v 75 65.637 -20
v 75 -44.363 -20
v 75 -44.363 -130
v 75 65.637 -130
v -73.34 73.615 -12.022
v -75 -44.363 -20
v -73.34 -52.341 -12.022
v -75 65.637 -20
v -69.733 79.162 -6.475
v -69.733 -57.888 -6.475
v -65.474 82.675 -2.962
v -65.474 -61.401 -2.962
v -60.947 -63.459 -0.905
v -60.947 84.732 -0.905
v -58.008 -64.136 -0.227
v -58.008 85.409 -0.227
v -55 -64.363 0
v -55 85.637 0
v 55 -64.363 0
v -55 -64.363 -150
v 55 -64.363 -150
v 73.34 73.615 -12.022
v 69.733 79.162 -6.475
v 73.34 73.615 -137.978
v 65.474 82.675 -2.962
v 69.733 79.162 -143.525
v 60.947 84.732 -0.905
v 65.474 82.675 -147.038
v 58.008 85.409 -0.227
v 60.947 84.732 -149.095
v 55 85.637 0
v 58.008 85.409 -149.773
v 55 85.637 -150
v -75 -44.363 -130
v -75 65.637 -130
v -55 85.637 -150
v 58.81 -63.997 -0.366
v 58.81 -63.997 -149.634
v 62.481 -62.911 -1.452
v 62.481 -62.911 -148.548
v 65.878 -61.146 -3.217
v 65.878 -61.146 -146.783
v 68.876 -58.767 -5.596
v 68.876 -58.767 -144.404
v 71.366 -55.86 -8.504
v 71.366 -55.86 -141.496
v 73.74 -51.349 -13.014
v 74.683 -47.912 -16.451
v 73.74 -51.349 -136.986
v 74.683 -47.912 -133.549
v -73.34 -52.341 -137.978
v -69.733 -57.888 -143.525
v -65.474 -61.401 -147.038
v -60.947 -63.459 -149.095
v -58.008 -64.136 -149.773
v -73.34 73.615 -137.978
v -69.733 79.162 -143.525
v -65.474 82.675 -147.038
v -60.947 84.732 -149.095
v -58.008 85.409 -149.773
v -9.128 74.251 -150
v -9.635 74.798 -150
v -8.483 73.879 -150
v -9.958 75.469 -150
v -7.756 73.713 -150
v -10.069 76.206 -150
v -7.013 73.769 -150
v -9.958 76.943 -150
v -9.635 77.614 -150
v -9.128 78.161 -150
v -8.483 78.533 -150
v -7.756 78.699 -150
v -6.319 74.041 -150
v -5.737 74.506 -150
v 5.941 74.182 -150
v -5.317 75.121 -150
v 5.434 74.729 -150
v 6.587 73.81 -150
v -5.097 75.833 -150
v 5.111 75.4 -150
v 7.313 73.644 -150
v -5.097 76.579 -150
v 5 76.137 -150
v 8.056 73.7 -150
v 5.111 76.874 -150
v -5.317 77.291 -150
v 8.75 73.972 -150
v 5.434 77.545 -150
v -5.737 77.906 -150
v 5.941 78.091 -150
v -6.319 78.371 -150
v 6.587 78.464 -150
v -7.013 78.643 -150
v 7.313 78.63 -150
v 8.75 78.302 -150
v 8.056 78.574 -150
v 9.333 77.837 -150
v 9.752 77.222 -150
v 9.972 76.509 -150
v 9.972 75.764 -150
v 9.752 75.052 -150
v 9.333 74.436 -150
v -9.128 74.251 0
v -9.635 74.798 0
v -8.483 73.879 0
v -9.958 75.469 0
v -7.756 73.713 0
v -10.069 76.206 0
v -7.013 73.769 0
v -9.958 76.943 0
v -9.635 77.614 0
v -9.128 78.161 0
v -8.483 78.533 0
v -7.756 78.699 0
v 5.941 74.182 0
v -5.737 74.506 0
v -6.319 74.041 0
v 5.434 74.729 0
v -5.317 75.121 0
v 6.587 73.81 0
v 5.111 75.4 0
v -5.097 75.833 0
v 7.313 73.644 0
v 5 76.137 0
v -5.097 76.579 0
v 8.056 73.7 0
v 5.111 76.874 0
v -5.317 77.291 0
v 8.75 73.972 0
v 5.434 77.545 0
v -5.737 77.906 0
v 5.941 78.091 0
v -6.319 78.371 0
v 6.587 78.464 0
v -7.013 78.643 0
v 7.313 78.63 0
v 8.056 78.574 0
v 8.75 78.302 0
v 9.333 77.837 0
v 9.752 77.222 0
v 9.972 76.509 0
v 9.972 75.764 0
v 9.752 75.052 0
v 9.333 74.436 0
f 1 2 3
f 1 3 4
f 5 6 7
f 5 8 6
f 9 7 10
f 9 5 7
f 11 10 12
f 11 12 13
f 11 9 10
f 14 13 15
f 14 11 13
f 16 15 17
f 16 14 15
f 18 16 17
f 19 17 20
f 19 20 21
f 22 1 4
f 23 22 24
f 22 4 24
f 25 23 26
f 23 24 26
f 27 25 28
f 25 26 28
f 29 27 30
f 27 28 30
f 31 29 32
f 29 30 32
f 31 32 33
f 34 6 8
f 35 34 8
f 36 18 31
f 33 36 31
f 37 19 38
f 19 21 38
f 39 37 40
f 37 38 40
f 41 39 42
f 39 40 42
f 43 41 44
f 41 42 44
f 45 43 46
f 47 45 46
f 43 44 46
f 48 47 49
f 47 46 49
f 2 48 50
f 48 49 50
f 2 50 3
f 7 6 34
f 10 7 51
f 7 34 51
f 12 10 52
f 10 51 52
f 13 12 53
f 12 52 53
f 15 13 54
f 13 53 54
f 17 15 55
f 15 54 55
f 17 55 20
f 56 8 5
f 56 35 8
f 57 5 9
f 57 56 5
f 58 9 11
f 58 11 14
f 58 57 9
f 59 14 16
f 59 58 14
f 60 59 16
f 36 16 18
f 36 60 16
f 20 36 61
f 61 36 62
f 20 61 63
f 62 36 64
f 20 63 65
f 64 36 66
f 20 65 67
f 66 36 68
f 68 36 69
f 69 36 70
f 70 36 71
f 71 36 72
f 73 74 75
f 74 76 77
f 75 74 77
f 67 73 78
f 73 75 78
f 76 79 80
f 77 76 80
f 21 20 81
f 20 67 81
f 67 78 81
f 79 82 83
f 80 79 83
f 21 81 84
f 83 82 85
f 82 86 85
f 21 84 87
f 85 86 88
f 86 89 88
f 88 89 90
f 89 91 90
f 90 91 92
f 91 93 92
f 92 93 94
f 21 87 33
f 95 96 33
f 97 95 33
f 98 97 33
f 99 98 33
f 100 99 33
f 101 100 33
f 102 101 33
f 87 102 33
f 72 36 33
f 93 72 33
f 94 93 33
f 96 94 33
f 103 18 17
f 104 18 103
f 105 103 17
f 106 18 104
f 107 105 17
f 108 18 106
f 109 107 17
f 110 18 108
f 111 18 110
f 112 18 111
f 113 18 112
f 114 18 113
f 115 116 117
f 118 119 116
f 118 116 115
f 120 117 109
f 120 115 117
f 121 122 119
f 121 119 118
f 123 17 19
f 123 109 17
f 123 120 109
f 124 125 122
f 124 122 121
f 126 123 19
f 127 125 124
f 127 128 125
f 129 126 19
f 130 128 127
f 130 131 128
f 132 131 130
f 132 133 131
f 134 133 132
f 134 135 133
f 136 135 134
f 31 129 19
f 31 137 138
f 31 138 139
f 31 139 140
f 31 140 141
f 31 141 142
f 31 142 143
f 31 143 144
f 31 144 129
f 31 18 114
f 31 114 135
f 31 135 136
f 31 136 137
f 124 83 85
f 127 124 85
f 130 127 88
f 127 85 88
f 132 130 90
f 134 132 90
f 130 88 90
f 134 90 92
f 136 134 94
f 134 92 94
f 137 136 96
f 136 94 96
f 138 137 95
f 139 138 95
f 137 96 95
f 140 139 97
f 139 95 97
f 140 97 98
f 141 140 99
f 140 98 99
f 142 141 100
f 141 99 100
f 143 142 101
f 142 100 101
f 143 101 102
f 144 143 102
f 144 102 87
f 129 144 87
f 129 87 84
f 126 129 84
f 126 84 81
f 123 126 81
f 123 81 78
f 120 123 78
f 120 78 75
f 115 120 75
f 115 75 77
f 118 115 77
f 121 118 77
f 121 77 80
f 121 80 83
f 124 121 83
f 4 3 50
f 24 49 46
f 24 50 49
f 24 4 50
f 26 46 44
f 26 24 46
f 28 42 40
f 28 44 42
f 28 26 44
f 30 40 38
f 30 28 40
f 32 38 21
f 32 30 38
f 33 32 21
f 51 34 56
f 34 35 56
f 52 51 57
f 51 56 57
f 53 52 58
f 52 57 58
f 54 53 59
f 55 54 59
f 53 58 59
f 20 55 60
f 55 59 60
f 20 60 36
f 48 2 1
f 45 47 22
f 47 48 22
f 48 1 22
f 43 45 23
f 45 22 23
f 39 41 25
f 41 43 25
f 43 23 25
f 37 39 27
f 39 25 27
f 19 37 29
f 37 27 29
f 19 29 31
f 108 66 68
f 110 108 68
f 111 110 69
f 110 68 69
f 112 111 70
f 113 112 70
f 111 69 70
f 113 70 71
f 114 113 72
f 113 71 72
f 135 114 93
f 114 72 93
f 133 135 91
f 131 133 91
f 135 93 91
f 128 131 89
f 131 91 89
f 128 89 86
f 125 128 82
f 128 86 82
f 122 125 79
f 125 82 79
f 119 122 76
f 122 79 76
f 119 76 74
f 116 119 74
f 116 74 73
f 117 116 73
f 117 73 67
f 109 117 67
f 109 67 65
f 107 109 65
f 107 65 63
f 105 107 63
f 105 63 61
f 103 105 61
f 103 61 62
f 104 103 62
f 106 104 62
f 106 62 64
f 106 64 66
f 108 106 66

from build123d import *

# Parameters (mm, degrees)
F0_W     = 150
F0_H     = 150
F1_DEPTH = 150.000006
F2_R     = 20
F4_D     = 5


with BuildPart() as f1:
    # F0 (on Top) → F1 (new body)
    with BuildSketch(Plane.XY):
        with Locations((0, 10.636854)):
            Rectangle(F0_W, F0_H)
    extrude(amount=-F1_DEPTH)

    # F2
    f2_edges = [f1.edges().sort_by_distance(p)[0] for p in [
        (-75, 85.636854, -75.000003),
        (-75, -64.363146, -75.000003),
        (-75, 10.636854, 0),
        (-75, 10.636854, -150.000006),
        (75, -64.363146, -75.000003),
        (75, 85.636854, -75.000003),
        (75, 10.636854, 0),
        (75, 10.636854, -150.000006),
    ]]
    fillet(f2_edges, radius=F2_R)

    # F4 (through all)
    with Locations(Plane.XY):
        with Locations((7.5, 76.136854), (-7.569213, 76.206067)):
            Hole(F4_D / 2)


solid = f1.part
